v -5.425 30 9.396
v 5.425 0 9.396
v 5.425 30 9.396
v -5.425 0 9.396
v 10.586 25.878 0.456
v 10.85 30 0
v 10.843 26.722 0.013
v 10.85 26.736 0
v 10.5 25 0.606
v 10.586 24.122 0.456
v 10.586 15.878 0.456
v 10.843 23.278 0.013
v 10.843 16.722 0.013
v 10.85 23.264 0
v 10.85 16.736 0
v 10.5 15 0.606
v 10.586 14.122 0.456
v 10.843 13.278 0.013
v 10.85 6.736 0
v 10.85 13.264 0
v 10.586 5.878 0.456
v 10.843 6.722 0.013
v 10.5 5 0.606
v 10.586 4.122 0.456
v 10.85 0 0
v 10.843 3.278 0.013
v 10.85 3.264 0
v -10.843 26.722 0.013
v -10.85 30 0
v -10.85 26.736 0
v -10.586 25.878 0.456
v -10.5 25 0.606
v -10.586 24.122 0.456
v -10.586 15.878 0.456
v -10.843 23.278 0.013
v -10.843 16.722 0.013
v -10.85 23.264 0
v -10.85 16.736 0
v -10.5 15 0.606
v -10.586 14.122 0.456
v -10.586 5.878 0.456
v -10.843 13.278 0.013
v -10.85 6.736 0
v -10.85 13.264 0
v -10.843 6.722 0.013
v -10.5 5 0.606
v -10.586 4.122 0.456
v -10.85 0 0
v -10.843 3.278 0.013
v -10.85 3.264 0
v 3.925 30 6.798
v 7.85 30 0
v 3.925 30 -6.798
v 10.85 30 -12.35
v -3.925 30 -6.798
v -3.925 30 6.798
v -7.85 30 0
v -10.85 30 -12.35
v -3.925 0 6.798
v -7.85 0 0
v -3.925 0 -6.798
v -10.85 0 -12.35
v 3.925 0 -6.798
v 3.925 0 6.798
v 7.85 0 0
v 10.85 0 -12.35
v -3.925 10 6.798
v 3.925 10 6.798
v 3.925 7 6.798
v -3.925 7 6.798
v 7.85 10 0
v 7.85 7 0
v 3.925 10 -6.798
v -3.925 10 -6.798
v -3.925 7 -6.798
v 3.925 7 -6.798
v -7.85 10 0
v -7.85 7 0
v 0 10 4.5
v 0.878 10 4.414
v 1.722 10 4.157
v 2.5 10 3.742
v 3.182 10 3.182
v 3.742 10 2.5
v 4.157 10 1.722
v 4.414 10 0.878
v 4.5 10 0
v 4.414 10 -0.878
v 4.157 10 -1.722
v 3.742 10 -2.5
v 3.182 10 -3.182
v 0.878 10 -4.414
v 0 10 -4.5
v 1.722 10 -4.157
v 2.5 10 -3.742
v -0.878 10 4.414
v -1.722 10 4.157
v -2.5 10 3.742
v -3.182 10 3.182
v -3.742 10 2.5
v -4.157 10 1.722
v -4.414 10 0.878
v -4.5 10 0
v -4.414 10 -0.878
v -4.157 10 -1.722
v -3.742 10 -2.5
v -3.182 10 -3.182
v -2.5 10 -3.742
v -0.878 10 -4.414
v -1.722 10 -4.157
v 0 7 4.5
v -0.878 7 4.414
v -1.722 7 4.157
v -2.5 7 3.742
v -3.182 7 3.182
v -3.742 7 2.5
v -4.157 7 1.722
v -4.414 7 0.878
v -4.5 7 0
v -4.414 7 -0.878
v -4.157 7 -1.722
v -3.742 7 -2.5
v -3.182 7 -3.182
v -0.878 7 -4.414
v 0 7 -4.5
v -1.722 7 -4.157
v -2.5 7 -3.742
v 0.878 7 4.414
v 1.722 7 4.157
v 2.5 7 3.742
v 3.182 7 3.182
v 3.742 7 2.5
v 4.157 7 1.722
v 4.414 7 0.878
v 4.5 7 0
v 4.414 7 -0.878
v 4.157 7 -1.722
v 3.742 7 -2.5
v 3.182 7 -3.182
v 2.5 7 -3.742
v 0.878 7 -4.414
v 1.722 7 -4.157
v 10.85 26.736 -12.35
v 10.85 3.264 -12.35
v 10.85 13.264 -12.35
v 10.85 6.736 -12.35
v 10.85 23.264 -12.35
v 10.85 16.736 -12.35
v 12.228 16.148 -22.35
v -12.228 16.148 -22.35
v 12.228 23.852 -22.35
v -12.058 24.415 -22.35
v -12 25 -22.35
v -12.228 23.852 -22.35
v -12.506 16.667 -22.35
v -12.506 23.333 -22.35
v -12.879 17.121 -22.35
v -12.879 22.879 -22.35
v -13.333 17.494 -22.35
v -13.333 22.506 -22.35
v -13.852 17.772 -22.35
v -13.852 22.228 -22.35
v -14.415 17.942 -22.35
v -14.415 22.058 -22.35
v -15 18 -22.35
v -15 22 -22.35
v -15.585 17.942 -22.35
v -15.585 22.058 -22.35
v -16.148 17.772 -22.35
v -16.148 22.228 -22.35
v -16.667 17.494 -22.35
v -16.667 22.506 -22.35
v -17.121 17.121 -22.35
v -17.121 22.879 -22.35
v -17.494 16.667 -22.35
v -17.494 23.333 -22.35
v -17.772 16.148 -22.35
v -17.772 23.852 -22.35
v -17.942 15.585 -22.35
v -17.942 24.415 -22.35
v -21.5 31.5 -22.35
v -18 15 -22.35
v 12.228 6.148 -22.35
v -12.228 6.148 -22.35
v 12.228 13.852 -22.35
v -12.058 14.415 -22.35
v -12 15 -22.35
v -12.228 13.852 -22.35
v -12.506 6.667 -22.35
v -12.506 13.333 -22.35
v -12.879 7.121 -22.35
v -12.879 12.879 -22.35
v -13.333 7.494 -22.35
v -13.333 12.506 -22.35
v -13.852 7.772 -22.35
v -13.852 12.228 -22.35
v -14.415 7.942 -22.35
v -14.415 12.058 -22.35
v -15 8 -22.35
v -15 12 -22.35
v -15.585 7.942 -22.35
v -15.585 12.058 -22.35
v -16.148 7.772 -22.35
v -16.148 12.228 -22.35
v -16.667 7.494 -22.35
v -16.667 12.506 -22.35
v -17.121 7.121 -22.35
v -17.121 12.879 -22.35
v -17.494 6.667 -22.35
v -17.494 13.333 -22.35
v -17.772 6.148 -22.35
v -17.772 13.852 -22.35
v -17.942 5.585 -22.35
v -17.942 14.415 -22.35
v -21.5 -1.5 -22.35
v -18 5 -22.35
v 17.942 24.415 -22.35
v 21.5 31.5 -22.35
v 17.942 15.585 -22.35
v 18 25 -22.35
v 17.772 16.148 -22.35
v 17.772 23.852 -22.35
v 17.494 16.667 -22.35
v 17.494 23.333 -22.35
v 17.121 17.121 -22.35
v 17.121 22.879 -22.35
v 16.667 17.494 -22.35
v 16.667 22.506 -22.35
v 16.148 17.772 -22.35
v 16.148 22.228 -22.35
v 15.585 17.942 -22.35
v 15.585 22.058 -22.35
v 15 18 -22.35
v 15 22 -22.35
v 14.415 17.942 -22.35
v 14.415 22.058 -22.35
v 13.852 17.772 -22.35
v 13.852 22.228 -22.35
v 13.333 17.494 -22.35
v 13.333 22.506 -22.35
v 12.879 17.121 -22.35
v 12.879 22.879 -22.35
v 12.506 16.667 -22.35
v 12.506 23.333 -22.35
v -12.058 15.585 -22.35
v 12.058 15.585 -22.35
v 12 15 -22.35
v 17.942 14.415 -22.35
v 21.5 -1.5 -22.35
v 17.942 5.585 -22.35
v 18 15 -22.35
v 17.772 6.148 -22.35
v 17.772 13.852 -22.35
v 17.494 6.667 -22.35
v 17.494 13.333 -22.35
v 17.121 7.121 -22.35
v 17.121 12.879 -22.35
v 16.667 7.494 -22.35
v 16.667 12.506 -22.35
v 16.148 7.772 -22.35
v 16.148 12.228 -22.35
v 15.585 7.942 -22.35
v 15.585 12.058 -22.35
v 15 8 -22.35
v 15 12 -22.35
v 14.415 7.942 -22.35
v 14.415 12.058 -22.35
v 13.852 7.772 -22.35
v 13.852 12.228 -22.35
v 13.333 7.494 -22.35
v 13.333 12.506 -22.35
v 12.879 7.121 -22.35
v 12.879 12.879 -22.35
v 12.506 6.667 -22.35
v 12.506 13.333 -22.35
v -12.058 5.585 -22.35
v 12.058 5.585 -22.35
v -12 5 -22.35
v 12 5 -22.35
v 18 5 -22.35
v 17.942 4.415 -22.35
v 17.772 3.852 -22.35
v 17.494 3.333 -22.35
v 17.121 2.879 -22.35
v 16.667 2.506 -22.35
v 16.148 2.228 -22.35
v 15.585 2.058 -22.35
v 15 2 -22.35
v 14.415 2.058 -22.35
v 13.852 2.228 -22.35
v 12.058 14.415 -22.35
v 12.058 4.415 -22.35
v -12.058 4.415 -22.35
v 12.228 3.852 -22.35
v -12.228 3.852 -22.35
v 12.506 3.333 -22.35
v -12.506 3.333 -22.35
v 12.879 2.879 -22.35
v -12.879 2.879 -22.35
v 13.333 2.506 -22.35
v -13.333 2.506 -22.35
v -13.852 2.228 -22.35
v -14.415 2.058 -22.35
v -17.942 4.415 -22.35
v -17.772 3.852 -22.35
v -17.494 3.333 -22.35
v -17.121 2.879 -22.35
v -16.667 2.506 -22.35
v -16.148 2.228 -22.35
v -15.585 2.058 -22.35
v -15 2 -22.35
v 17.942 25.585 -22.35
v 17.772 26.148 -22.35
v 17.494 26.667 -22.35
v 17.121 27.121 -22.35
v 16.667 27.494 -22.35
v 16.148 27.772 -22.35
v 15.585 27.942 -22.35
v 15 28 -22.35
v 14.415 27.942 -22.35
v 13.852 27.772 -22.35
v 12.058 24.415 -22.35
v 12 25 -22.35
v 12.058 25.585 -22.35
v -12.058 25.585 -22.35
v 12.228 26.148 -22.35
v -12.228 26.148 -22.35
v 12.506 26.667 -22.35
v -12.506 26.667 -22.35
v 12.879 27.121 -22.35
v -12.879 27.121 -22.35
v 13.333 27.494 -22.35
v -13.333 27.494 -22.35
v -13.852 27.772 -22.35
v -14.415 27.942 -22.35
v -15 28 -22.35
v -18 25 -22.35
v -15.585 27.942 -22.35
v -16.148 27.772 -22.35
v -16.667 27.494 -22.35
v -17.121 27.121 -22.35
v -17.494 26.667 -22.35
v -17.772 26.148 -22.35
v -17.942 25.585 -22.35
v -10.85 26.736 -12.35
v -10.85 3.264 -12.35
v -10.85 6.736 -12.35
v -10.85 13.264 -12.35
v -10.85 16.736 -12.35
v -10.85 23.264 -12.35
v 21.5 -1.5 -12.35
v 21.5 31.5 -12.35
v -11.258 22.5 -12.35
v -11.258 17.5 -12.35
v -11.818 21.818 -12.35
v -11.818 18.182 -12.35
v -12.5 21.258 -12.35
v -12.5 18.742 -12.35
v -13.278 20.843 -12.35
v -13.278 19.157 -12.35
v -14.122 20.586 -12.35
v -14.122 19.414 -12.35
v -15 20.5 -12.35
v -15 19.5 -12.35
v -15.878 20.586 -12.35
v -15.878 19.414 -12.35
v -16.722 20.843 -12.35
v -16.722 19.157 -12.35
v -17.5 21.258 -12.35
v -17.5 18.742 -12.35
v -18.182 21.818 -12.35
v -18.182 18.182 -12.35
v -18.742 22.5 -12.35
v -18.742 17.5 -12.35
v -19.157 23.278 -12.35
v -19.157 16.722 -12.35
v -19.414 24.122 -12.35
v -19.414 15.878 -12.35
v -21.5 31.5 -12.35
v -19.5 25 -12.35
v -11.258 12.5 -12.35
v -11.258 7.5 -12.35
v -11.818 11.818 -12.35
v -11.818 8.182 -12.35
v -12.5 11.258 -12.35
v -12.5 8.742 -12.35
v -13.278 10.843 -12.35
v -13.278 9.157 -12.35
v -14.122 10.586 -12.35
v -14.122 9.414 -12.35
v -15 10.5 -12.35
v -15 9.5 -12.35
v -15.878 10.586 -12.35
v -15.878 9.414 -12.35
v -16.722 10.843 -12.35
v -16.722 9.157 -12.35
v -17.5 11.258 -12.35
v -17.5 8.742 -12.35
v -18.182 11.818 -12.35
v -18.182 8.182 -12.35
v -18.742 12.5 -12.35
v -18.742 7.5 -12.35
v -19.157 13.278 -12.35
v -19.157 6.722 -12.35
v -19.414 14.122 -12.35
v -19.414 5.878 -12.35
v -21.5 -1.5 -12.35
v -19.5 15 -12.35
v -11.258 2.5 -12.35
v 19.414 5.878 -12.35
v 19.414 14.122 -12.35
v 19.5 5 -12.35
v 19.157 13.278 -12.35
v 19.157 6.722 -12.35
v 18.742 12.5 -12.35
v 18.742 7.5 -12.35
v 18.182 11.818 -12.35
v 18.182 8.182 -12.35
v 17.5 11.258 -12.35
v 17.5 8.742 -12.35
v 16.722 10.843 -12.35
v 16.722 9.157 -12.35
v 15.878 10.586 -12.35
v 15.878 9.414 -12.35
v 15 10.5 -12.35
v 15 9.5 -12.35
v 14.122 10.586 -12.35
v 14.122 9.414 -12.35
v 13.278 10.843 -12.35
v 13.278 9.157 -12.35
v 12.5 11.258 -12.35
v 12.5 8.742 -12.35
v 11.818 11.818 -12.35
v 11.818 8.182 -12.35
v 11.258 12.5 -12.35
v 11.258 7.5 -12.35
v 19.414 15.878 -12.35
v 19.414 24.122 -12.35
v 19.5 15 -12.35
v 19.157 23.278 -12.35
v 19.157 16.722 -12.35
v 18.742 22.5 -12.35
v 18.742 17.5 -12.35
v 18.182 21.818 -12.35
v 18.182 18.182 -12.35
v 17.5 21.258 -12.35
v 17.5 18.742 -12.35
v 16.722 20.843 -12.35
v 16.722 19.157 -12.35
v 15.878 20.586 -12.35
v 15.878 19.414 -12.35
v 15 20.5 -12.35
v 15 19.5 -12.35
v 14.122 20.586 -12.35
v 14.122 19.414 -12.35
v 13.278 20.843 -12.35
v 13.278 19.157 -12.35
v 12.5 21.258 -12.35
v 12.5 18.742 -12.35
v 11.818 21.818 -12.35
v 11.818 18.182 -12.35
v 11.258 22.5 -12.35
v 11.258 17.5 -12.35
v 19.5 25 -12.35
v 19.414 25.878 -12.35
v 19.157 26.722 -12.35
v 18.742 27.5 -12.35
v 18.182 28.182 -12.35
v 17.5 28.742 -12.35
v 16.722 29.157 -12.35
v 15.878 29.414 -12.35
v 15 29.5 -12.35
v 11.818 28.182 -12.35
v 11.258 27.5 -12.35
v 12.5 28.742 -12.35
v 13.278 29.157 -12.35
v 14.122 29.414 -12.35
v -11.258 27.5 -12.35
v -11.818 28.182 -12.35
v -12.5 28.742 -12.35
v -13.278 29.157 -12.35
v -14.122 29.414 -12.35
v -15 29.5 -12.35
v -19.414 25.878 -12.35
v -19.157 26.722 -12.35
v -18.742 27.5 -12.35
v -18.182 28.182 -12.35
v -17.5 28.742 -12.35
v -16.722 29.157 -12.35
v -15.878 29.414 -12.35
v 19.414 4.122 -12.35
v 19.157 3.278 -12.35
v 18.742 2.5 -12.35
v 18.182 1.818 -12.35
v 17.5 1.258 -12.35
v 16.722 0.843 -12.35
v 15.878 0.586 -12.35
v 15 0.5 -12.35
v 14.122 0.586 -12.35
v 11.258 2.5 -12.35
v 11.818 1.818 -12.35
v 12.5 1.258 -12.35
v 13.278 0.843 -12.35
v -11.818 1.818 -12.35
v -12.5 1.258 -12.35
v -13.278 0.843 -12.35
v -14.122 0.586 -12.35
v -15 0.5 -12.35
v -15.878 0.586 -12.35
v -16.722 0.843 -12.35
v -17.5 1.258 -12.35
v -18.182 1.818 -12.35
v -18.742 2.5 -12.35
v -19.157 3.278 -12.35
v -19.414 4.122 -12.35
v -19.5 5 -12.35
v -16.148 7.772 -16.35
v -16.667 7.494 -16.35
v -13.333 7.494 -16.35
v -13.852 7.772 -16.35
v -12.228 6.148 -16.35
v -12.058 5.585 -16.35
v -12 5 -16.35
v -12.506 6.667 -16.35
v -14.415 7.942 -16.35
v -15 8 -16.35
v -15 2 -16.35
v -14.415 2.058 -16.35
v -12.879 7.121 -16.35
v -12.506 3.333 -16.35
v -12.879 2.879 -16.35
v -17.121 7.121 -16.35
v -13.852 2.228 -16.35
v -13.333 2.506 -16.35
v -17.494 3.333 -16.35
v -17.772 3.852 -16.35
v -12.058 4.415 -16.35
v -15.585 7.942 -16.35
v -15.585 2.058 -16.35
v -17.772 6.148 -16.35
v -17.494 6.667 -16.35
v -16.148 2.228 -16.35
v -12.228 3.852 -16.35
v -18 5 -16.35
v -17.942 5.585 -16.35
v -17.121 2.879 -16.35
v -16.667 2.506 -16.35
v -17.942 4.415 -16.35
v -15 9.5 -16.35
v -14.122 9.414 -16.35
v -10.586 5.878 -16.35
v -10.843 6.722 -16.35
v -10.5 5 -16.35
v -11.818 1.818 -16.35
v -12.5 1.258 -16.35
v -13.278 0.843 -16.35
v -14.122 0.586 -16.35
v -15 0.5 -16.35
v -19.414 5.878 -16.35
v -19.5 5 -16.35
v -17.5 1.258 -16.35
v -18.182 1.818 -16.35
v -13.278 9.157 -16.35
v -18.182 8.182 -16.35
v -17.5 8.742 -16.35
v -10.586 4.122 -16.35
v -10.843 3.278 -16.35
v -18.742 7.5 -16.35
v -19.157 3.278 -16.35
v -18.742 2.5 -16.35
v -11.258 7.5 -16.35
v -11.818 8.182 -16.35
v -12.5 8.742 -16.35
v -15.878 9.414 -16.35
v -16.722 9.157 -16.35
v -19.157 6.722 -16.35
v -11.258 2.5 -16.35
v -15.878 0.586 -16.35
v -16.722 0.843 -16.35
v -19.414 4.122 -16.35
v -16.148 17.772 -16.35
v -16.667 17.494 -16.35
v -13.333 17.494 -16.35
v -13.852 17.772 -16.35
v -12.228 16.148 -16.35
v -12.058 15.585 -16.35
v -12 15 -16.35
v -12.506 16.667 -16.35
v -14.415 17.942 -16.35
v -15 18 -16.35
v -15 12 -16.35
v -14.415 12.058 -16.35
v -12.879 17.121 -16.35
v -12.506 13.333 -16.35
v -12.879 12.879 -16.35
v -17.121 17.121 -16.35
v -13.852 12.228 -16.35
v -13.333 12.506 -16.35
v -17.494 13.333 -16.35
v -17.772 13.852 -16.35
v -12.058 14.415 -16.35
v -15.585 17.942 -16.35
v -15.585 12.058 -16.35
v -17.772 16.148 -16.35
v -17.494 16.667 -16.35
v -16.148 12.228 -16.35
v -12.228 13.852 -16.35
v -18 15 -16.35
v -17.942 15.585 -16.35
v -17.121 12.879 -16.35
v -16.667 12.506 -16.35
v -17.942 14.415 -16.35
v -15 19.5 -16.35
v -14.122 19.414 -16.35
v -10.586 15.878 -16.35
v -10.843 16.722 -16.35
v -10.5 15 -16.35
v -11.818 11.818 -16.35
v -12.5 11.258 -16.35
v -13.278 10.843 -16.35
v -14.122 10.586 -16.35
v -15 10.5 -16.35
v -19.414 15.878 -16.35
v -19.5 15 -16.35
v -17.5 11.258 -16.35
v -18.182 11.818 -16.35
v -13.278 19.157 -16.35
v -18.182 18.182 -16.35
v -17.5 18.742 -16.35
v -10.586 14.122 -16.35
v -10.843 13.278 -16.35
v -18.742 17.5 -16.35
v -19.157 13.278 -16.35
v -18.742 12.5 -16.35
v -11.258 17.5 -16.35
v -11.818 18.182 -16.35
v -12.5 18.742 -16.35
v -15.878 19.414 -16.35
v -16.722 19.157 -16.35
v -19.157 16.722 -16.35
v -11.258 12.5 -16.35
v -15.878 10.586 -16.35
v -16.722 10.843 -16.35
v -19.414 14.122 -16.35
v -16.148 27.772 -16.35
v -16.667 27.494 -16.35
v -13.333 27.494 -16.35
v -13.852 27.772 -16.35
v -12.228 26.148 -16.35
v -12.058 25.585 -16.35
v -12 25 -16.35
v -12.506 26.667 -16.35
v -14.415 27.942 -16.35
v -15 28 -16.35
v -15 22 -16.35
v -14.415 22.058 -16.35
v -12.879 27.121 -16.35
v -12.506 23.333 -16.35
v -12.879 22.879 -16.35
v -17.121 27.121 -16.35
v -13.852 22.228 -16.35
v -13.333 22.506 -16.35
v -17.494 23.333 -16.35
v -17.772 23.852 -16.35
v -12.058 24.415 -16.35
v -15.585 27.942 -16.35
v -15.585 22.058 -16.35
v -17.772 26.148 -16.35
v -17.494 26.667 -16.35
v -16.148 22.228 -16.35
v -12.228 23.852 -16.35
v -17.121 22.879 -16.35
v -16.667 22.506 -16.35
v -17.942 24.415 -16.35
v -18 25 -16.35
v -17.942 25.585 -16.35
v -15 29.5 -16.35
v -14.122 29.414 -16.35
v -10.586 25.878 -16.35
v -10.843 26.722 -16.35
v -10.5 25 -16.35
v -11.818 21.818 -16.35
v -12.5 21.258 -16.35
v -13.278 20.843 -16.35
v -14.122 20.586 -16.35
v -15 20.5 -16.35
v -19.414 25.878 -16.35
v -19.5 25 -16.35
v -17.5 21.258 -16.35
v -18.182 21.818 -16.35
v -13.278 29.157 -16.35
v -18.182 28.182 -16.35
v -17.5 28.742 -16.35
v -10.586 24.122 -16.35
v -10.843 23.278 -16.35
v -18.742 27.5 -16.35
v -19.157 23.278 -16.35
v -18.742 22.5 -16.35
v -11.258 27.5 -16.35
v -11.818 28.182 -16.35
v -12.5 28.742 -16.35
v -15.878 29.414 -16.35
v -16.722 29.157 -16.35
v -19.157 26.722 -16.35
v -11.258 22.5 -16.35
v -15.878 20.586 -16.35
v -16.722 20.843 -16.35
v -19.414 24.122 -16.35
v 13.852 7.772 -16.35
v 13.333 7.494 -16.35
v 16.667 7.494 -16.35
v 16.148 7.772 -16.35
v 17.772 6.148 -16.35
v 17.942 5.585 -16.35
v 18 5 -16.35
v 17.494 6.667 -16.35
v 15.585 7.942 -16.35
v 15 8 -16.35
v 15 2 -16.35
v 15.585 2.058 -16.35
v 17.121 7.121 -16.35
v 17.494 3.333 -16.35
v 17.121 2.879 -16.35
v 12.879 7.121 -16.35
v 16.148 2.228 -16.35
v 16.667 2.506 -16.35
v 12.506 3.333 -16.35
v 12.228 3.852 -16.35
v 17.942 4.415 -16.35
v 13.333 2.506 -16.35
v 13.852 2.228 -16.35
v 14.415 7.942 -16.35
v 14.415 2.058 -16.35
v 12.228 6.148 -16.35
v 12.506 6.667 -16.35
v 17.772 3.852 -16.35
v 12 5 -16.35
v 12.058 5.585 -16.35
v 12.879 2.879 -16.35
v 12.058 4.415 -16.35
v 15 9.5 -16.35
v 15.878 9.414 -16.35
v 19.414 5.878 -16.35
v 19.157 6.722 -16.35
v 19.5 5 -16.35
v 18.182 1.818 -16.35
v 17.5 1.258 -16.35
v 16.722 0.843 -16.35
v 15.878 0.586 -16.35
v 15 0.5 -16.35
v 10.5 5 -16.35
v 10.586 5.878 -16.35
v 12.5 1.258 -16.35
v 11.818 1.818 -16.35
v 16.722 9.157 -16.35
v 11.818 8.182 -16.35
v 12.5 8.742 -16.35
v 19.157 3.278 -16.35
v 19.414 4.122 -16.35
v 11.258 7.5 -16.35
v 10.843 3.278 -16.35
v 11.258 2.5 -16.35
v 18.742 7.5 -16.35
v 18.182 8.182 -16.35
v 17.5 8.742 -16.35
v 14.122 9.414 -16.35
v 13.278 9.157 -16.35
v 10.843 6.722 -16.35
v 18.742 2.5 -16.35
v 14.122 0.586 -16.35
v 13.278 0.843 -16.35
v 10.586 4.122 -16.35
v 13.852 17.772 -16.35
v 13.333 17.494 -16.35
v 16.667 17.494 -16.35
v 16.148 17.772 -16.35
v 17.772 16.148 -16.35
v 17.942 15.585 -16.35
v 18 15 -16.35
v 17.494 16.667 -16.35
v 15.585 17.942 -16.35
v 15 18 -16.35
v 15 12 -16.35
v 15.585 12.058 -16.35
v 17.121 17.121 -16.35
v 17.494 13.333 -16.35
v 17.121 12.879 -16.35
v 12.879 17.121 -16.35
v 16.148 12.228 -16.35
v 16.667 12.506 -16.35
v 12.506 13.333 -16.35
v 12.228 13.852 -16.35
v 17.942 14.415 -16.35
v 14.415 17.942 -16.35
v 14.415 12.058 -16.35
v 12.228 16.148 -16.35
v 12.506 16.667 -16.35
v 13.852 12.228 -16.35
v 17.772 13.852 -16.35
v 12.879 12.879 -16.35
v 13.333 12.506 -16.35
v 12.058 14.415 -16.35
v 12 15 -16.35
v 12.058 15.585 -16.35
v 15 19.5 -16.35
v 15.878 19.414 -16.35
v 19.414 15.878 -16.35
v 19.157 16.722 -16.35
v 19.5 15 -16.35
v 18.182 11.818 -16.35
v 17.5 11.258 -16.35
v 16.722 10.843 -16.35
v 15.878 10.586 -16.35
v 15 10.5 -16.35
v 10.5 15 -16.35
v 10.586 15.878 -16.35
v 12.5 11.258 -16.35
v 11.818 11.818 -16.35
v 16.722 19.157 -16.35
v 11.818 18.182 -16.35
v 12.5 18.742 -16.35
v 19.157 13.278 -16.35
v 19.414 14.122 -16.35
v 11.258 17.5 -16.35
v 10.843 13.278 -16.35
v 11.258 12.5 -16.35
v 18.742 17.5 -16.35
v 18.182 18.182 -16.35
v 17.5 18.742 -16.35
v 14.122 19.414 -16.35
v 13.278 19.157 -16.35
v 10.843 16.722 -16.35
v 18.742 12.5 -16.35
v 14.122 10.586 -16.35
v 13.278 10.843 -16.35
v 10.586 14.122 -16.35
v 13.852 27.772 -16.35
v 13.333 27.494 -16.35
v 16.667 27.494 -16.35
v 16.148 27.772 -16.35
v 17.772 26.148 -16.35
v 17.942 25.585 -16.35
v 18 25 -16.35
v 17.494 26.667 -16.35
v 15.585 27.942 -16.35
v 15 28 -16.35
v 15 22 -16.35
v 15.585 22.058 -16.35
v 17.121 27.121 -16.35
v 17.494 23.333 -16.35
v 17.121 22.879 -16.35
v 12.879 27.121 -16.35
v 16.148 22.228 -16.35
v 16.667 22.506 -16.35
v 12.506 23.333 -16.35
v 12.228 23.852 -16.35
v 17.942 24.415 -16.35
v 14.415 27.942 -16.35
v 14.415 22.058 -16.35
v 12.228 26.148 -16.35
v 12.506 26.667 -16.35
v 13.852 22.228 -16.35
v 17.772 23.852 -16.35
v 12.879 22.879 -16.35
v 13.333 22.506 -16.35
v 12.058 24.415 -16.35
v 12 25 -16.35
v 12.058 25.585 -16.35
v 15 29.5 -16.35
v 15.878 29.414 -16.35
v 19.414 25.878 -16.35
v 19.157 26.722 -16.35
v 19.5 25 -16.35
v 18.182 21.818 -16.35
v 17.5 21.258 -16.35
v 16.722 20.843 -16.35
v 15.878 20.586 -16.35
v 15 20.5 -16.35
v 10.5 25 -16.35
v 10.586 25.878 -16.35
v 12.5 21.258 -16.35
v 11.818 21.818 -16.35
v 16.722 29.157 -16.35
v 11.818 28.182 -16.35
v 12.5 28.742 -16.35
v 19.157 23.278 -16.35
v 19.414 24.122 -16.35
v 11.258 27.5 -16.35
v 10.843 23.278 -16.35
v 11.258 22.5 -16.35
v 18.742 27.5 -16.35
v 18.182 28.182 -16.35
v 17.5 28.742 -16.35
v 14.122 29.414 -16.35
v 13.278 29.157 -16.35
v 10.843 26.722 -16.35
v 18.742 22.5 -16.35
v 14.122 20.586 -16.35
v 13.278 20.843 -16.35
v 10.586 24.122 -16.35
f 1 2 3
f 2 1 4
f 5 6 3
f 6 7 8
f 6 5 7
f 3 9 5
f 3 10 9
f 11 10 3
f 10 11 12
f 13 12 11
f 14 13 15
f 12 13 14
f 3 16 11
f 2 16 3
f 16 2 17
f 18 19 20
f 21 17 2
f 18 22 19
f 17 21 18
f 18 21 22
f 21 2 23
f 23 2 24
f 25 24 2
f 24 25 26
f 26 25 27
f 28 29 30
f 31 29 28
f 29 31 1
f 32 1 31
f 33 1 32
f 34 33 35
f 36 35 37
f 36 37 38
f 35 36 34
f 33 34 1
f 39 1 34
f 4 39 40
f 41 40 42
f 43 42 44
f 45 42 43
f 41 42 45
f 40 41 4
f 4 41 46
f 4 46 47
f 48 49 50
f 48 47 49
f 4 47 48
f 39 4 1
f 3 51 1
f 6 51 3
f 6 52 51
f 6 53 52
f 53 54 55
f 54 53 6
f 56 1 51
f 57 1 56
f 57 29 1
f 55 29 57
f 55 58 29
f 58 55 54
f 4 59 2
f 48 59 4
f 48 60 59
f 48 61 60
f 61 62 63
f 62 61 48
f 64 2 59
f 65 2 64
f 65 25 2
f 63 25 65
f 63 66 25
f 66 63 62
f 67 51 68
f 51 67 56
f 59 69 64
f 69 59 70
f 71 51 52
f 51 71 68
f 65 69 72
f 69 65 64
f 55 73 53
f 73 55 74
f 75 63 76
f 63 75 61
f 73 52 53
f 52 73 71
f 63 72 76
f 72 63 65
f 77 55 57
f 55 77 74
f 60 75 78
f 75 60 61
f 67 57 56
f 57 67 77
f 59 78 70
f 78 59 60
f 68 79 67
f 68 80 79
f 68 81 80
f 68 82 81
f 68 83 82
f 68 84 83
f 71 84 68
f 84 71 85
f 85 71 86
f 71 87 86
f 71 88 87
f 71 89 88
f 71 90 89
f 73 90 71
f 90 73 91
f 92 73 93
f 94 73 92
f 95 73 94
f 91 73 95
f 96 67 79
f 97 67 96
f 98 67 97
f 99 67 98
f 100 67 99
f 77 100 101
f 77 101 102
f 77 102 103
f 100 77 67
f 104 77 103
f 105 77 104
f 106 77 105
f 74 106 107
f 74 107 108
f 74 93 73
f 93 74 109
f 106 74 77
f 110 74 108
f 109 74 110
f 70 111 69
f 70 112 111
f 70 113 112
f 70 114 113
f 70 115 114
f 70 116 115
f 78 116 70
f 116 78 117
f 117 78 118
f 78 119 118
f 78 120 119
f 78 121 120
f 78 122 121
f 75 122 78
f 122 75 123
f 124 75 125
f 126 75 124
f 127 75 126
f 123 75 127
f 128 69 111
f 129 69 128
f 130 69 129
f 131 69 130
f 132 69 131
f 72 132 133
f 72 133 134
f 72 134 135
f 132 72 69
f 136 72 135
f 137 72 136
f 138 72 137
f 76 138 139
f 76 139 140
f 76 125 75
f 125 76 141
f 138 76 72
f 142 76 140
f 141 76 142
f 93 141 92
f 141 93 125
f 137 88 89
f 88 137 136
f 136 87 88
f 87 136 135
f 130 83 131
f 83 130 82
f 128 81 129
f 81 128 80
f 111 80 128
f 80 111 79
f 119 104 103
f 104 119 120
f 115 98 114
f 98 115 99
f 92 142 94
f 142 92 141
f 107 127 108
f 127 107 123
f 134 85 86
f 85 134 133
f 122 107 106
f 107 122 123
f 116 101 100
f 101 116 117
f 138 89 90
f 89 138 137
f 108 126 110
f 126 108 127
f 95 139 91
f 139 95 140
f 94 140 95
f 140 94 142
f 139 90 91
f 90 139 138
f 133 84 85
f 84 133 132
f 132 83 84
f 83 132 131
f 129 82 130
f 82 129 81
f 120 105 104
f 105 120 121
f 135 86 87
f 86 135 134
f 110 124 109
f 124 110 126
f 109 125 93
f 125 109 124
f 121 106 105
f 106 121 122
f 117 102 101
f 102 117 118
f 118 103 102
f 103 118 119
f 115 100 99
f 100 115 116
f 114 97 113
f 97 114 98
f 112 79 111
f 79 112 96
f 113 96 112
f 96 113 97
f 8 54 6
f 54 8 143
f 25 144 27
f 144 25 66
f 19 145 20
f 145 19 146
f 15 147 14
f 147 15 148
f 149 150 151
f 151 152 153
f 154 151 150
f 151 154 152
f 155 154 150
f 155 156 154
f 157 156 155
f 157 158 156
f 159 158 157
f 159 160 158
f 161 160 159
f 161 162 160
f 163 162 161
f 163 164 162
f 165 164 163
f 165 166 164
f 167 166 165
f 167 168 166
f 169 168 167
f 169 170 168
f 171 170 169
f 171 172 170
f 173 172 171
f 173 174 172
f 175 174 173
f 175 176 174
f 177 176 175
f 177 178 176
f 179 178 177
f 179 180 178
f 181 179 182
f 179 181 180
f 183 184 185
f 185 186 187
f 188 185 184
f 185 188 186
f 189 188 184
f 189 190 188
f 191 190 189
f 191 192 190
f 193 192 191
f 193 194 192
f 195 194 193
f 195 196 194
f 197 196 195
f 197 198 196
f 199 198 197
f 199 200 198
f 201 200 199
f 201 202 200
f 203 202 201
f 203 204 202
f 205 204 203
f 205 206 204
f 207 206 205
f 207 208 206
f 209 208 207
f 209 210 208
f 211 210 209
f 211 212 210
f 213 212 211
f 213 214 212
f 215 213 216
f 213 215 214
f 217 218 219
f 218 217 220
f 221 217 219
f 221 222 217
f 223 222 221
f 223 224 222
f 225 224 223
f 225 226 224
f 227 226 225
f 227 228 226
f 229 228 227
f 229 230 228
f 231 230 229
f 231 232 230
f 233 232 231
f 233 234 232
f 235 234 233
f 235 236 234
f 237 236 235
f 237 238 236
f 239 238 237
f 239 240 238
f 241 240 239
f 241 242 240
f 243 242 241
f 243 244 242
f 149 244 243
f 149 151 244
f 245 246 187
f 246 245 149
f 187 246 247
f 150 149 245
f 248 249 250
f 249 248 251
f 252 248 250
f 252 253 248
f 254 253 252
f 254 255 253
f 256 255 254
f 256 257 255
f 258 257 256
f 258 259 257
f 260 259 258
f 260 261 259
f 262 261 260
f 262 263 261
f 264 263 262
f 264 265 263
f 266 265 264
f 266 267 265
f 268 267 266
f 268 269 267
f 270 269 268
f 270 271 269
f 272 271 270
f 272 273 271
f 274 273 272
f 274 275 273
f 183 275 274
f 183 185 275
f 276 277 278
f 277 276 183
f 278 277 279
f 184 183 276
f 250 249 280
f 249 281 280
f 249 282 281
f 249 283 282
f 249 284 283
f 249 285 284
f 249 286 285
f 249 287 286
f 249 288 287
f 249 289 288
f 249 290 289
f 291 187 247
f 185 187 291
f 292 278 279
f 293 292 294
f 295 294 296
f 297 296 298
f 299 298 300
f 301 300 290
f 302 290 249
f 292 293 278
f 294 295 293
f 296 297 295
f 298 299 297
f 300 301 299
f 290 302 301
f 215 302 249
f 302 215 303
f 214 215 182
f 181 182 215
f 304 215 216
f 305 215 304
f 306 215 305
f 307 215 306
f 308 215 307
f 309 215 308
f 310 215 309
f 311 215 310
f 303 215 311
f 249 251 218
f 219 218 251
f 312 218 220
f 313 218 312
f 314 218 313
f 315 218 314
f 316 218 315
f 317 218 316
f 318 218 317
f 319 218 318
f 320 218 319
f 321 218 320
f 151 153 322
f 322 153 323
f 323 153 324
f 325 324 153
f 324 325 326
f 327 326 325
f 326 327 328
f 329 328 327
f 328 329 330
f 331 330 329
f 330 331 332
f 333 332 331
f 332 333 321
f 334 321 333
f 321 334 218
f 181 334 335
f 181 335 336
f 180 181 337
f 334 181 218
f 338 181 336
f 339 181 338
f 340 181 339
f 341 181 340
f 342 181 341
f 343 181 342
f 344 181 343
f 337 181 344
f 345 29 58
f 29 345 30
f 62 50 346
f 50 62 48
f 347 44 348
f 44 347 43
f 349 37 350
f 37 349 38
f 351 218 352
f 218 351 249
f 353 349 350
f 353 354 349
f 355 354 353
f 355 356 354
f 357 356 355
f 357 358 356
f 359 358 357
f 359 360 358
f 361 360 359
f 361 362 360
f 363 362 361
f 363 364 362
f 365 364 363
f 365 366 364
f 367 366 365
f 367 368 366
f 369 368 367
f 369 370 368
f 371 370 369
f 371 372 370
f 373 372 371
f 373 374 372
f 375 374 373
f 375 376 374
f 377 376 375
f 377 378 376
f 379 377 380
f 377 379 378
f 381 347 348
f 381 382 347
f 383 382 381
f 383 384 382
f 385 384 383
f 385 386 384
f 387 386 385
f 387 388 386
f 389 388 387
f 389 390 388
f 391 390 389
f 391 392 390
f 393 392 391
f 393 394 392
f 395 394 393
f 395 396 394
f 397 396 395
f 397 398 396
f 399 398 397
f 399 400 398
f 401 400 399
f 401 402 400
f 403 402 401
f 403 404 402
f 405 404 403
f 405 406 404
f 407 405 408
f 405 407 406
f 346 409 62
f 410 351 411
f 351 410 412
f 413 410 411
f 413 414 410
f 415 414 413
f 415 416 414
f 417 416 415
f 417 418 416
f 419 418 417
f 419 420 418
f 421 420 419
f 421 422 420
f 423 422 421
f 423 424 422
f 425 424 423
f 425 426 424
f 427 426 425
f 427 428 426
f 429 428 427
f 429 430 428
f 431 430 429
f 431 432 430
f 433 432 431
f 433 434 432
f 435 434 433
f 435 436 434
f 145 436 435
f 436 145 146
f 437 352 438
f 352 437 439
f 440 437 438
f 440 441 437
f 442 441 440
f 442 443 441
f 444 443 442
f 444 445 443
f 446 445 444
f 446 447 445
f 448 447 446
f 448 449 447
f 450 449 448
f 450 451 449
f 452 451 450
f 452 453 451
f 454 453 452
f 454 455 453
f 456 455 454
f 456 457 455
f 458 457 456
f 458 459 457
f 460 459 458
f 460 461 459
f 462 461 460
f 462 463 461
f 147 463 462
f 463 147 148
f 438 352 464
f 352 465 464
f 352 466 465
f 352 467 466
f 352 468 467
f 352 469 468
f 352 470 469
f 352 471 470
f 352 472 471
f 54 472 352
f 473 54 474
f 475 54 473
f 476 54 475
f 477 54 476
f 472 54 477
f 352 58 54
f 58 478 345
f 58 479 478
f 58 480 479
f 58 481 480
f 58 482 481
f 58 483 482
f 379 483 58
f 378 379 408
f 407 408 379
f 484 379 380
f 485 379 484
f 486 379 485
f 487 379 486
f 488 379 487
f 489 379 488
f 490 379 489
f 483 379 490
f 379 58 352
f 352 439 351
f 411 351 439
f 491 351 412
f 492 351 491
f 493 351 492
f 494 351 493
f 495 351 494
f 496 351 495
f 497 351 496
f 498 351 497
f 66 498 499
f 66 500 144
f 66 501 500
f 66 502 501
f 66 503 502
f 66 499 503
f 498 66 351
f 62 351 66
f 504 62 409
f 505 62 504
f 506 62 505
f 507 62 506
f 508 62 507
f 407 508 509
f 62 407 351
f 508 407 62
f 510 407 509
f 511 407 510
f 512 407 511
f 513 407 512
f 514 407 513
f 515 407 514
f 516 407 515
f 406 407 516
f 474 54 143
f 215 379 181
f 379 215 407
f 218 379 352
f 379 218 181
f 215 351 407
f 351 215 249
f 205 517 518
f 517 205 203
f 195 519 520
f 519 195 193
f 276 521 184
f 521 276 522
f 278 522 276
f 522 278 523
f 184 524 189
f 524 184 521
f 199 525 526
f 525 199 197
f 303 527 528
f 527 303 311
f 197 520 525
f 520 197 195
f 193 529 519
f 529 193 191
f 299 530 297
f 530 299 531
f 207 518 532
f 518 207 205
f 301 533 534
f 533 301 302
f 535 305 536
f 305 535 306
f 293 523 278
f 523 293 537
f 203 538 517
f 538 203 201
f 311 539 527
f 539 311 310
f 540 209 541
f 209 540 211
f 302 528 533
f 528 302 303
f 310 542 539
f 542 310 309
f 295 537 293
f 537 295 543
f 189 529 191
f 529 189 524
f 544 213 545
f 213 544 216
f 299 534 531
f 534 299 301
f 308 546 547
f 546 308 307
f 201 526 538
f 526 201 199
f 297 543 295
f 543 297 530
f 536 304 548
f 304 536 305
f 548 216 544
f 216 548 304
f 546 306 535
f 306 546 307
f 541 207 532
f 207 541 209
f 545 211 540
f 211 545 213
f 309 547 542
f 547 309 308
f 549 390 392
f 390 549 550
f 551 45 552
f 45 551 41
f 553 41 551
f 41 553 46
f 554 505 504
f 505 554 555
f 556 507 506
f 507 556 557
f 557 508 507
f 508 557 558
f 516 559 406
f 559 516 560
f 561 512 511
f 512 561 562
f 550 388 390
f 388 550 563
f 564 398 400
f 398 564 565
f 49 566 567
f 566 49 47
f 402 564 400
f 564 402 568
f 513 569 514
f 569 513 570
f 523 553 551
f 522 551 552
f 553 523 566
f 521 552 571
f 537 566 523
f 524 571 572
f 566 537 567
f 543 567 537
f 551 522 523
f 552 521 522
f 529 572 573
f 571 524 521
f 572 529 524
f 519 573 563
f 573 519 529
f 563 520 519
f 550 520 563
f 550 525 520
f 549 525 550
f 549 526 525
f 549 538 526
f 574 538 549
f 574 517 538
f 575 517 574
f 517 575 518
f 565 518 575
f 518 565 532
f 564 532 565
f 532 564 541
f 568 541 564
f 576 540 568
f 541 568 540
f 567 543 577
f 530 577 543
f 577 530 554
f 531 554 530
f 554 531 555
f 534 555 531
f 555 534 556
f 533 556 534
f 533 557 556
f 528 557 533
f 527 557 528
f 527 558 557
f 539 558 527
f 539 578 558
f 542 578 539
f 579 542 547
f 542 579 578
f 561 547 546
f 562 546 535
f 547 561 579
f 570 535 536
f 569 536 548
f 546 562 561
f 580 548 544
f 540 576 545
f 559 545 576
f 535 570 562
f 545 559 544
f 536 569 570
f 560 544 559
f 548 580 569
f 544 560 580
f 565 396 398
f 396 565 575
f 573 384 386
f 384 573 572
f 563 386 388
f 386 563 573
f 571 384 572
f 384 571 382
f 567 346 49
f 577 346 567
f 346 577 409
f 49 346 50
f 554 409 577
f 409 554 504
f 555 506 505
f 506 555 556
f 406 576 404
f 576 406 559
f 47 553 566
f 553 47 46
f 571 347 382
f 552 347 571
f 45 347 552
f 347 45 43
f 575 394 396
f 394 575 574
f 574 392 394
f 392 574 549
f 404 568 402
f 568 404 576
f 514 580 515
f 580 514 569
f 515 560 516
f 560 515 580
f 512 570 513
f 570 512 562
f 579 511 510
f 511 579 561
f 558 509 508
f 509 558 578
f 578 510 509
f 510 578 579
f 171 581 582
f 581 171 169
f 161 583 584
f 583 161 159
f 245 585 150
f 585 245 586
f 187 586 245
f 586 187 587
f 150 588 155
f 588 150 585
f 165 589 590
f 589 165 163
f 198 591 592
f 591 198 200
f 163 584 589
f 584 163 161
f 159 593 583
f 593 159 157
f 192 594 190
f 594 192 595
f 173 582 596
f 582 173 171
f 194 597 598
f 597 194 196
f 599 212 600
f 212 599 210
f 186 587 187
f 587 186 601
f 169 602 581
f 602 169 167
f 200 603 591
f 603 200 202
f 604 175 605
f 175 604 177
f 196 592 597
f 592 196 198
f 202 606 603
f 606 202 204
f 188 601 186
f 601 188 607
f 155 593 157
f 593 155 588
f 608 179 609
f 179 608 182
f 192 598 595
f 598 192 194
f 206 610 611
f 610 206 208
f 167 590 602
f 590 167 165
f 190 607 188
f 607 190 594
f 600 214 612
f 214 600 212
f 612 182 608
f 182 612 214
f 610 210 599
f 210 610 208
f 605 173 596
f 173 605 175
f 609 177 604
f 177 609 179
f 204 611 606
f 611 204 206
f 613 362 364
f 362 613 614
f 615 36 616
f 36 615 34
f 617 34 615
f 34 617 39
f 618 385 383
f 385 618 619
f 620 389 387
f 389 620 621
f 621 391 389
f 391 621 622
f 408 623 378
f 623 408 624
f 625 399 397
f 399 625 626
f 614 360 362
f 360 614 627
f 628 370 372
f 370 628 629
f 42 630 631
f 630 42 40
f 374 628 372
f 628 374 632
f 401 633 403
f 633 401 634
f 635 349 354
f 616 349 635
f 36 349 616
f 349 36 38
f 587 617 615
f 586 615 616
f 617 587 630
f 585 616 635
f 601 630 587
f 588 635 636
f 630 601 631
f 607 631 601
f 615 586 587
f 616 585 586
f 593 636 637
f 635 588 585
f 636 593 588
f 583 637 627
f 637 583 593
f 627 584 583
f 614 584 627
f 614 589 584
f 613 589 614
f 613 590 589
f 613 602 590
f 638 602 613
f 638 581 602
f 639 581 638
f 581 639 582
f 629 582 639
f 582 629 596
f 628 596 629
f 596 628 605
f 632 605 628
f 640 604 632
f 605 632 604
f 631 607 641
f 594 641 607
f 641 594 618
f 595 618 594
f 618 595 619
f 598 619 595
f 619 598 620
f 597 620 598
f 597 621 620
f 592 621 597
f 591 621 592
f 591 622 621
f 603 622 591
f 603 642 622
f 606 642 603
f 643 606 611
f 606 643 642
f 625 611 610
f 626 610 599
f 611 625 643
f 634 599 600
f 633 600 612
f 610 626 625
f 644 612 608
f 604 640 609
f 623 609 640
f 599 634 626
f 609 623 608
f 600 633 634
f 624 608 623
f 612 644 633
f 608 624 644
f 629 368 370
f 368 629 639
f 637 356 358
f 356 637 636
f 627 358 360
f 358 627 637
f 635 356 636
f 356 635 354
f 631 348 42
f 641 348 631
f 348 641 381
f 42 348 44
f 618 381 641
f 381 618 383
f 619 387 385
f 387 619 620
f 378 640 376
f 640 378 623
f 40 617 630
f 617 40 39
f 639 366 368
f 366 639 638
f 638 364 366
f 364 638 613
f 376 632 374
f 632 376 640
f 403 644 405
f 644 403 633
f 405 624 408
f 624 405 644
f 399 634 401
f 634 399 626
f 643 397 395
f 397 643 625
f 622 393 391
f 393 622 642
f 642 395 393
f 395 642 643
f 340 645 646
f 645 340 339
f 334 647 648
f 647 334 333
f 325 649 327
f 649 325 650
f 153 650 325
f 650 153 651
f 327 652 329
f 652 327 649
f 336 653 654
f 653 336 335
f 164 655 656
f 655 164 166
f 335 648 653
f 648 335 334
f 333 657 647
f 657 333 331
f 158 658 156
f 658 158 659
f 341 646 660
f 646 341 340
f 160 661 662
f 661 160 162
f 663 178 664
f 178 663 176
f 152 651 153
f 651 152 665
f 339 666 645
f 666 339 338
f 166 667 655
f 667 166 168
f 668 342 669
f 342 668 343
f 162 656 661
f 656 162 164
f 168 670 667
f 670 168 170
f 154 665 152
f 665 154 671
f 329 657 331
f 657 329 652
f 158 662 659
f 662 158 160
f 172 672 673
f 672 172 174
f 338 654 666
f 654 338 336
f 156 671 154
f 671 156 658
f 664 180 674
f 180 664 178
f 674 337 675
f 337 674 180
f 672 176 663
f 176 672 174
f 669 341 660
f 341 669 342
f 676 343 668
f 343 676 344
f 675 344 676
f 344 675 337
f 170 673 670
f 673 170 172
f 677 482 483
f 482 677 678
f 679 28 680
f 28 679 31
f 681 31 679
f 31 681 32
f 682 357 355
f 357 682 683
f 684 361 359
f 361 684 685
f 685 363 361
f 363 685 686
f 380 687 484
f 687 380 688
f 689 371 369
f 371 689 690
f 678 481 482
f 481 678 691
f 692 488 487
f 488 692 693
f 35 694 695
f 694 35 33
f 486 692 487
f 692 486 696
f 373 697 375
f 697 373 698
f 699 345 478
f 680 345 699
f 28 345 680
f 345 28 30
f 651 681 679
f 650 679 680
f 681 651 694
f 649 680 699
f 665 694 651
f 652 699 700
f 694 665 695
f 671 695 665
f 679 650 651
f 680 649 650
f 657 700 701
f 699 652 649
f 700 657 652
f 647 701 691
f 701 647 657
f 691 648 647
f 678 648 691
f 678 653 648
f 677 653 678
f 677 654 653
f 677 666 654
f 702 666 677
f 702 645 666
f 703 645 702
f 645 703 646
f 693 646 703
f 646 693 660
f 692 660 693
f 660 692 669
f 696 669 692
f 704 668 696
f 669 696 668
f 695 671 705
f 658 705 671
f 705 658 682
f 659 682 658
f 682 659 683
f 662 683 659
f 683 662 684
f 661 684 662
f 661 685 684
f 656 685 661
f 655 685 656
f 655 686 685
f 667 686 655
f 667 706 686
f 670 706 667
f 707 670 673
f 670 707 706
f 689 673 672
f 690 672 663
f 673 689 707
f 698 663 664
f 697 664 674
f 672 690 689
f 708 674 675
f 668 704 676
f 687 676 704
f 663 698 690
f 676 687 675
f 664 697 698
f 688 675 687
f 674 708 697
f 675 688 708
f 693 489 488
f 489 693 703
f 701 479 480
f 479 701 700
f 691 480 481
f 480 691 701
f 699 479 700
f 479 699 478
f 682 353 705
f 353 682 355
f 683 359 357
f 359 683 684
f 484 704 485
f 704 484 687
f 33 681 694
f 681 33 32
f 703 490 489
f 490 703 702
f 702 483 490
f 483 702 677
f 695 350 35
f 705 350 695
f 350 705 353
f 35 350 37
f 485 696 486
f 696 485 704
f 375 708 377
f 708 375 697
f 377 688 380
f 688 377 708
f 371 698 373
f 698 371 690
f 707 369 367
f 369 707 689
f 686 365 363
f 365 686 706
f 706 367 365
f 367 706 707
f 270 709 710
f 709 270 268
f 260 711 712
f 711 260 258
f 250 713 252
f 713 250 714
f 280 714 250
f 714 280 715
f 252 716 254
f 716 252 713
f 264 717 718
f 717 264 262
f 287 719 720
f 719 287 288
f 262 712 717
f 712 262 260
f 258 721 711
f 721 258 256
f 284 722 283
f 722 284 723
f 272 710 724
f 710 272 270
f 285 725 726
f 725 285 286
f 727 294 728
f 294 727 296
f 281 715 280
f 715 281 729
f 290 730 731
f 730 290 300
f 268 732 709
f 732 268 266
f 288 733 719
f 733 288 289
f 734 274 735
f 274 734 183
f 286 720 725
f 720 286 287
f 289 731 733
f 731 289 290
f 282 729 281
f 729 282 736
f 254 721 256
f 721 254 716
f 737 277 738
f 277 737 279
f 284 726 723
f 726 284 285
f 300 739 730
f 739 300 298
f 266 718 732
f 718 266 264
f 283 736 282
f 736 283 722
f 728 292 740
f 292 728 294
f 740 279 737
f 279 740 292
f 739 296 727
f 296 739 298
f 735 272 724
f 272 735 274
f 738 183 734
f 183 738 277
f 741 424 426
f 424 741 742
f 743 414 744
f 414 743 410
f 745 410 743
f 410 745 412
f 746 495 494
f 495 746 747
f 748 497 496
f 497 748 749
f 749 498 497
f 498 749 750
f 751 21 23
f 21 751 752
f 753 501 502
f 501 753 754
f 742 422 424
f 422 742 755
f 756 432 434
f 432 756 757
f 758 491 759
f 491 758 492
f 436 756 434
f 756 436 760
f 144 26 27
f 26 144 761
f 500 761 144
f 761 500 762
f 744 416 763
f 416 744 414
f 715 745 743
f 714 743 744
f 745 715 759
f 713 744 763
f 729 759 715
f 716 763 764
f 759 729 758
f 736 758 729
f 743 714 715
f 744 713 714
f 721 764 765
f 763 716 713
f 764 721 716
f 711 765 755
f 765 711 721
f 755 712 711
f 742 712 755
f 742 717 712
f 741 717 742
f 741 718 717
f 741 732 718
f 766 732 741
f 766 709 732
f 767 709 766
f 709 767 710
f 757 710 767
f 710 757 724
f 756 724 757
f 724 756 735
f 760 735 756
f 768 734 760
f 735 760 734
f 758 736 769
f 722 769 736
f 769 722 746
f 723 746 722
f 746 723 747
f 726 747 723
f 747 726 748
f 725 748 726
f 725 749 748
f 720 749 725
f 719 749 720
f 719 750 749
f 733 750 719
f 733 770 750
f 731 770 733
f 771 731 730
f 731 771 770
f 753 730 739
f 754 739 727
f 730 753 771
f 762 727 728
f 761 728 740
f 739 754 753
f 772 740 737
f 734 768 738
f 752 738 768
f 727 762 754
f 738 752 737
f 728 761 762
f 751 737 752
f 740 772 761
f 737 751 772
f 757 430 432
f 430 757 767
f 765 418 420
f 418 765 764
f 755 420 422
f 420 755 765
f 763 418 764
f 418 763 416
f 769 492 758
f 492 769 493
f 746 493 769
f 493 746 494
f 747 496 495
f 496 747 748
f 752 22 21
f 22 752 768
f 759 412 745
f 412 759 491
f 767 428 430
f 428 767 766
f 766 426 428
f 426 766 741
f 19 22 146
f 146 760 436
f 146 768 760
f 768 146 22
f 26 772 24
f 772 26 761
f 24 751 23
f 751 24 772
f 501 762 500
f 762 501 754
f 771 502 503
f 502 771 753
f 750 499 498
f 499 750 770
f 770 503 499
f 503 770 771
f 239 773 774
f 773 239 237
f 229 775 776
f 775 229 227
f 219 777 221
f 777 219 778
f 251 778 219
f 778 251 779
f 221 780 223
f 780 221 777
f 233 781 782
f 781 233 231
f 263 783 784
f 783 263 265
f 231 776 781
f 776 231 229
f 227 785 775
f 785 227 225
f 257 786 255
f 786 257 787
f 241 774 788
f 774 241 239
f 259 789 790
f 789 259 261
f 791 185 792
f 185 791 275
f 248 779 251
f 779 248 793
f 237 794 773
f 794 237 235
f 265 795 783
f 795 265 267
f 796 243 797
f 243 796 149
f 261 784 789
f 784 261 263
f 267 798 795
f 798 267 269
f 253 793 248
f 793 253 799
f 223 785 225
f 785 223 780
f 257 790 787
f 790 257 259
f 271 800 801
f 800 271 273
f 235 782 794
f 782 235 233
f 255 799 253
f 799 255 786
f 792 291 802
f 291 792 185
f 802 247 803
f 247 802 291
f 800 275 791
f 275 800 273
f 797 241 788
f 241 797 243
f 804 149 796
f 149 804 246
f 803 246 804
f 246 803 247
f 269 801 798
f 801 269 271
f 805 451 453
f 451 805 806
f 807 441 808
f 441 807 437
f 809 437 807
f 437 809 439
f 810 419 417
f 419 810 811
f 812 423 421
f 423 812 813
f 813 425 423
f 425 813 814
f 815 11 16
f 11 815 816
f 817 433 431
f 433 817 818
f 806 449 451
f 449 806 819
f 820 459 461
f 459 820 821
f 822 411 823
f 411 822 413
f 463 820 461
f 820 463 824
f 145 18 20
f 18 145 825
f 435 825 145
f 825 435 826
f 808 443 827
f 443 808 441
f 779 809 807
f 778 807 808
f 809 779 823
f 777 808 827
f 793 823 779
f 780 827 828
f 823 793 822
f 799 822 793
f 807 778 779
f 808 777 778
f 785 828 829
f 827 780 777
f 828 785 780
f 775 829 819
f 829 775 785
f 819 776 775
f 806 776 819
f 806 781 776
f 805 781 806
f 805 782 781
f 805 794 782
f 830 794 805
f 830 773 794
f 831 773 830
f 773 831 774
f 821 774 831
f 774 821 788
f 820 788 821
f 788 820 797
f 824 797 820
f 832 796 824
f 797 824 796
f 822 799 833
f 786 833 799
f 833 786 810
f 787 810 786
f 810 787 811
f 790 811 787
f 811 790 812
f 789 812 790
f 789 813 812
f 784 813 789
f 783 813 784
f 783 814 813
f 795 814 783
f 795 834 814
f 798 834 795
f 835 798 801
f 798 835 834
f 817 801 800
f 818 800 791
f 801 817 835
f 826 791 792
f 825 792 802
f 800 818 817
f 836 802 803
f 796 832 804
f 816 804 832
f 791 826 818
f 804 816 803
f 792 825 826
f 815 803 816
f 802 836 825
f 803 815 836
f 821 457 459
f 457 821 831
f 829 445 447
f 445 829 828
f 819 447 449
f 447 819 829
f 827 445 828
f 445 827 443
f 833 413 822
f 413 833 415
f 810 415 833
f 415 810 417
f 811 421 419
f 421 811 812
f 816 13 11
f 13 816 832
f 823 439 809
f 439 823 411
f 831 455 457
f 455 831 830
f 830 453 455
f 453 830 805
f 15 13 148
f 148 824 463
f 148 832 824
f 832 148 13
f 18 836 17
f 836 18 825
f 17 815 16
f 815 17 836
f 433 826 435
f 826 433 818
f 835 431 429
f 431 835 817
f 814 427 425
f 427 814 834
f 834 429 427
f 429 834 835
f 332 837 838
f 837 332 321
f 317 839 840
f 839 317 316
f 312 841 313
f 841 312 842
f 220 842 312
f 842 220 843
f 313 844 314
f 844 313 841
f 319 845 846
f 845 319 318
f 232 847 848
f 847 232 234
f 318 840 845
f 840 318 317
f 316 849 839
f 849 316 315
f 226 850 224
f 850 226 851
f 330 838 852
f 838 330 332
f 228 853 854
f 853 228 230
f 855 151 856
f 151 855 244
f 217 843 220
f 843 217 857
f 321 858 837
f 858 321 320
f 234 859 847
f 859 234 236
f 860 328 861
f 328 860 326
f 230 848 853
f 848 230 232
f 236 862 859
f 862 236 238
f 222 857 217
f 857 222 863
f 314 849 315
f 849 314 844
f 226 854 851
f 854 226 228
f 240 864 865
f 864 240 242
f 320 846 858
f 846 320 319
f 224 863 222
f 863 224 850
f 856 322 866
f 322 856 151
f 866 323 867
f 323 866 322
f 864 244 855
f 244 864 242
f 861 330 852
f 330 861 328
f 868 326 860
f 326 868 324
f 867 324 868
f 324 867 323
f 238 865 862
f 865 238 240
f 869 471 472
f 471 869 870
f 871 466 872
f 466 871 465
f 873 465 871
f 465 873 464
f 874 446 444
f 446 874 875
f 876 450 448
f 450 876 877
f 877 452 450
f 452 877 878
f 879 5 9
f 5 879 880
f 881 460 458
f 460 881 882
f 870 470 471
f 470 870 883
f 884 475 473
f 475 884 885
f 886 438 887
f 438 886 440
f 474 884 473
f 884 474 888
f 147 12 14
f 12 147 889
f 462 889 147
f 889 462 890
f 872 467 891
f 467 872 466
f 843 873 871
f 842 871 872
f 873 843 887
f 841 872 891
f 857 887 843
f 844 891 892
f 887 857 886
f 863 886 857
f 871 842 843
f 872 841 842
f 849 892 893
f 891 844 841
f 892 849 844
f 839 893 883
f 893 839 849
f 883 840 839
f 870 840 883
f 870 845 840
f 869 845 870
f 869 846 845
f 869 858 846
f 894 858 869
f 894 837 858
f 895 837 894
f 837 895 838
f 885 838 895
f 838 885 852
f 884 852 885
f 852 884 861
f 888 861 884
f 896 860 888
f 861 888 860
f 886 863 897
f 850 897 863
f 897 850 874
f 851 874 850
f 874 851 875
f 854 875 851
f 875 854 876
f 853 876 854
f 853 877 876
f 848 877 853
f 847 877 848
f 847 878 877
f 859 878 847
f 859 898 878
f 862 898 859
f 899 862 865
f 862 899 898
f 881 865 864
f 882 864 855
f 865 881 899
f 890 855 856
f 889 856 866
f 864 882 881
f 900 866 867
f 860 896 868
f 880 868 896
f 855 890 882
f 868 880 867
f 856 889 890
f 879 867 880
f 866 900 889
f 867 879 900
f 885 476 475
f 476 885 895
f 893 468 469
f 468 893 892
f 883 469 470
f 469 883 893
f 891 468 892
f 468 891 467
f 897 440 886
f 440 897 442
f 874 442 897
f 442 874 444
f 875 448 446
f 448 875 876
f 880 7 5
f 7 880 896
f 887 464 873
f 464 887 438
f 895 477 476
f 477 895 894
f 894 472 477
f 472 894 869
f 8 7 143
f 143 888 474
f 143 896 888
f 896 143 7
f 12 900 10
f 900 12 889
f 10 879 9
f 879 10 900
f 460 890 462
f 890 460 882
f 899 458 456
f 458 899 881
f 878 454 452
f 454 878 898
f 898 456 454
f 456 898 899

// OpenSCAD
m8_shaft_diameter = 9;
m8_nut_diameter = 15.7;
m8_pocket_depth = 7;
nut_holder_len = 30;
nut_holder_wall = 3;
nut_bottom_wall = 3;
nut_holder_outer_diam = m8_nut_diameter+2*nut_holder_wall;
nut_holder_flat_diam = nut_holder_outer_diam/(2*sqrt(1+(1/3)));

module leadscrew_nut_holder() {
	// rotate so hexagon is along positive y axis
	rotate([-90,0,0]){
		difference() {
			union() {
				// main hut holder profile
				difference() {
					// outer hexagon
					cylinder(r=nut_holder_outer_diam/2, h=nut_holder_len, $fn=6);
					// cut out inner hexagon at size of expected nut
					translate([0,0,-1])
						cylinder(r=m8_nut_diameter/2, h=nut_holder_len+2, $fn=6);
				}
				// wall below top nut
				translate([0,0,m8_pocket_depth])
					cylinder(r=nut_holder_outer_diam/2, h=nut_bottom_wall, $fn=6); 
			}
			// cut out shaft hole
			cylinder(r=m8_shaft_diameter/2, h=nut_holder_len, $fn=32);
		}
	}
}

module leadscrew_nut_holder_profile() {
	// rotate so hexagon is along positive y axis
	rotate([-90,0,0])
		// outer hexagon only
		translate([0,0,-1])
			cylinder(r=nut_holder_outer_diam/2, h=nut_holder_len+2, $fn=6);
}

m5_shaft_diam = 6;
m5_head_diam = 9;
m5_head_inset = 3;

dist_to_wheel = 10;
half_wheel = 11/2;
wheel_spacer = 25.4/4 /* 1/4" */;
x_axis_plate_thick = 0.5/*6*/;  // now assuming acryulic spacer

dist_to_shaft = dist_to_wheel+half_wheel+wheel_spacer+x_axis_plate_thick;
block_margin = 2;
mounting_spread_w = 30;
mounting_spread_h = 20;
block_base_w = mounting_spread_w+m5_head_diam+2*block_margin;
block_base_h = mounting_spread_h+m5_head_diam+2*block_margin;
block_base_thick = 10;

module leadscrew_block() { 
	difference() {
		union() {
			// nut holder
			leadscrew_nut_holder();
			// center support block under nut holder
			difference() {
				translate([-nut_holder_outer_diam/2,0,-dist_to_shaft])
					cube([nut_holder_outer_diam,nut_holder_len,dist_to_shaft]);
				leadscrew_nut_holder_profile();
			}
			// mounting block base
			translate([-block_base_w/2,
										-(block_base_h-nut_holder_len)/2,-dist_to_shaft]) 
				cube([block_base_w,block_base_h,block_base_thick]);
		}
		// mounting holes
		translate([-block_base_w/2,
										-(block_base_h-nut_holder_len)/2,-dist_to_shaft]) 
		translate([m5_head_diam/2+block_margin, m5_head_diam/2+block_margin, -1]) 
		union() {
			for (xoff=[0,mounting_spread_w]) {
				for (yoff=[0,mounting_spread_h/2,mounting_spread_h]) {
					translate([xoff,yoff,0]) {
					// bolt hole
					cylinder(r=m5_shaft_diam/2, h=block_base_thick+2,$fn=32);
					// countersink for head
					translate([0,0,block_base_thick-m5_head_inset])
						cylinder(r=m5_head_diam/2, h=500,$fn=32);
					}
				}
			}
		}
	}
}

leadscrew_block();
